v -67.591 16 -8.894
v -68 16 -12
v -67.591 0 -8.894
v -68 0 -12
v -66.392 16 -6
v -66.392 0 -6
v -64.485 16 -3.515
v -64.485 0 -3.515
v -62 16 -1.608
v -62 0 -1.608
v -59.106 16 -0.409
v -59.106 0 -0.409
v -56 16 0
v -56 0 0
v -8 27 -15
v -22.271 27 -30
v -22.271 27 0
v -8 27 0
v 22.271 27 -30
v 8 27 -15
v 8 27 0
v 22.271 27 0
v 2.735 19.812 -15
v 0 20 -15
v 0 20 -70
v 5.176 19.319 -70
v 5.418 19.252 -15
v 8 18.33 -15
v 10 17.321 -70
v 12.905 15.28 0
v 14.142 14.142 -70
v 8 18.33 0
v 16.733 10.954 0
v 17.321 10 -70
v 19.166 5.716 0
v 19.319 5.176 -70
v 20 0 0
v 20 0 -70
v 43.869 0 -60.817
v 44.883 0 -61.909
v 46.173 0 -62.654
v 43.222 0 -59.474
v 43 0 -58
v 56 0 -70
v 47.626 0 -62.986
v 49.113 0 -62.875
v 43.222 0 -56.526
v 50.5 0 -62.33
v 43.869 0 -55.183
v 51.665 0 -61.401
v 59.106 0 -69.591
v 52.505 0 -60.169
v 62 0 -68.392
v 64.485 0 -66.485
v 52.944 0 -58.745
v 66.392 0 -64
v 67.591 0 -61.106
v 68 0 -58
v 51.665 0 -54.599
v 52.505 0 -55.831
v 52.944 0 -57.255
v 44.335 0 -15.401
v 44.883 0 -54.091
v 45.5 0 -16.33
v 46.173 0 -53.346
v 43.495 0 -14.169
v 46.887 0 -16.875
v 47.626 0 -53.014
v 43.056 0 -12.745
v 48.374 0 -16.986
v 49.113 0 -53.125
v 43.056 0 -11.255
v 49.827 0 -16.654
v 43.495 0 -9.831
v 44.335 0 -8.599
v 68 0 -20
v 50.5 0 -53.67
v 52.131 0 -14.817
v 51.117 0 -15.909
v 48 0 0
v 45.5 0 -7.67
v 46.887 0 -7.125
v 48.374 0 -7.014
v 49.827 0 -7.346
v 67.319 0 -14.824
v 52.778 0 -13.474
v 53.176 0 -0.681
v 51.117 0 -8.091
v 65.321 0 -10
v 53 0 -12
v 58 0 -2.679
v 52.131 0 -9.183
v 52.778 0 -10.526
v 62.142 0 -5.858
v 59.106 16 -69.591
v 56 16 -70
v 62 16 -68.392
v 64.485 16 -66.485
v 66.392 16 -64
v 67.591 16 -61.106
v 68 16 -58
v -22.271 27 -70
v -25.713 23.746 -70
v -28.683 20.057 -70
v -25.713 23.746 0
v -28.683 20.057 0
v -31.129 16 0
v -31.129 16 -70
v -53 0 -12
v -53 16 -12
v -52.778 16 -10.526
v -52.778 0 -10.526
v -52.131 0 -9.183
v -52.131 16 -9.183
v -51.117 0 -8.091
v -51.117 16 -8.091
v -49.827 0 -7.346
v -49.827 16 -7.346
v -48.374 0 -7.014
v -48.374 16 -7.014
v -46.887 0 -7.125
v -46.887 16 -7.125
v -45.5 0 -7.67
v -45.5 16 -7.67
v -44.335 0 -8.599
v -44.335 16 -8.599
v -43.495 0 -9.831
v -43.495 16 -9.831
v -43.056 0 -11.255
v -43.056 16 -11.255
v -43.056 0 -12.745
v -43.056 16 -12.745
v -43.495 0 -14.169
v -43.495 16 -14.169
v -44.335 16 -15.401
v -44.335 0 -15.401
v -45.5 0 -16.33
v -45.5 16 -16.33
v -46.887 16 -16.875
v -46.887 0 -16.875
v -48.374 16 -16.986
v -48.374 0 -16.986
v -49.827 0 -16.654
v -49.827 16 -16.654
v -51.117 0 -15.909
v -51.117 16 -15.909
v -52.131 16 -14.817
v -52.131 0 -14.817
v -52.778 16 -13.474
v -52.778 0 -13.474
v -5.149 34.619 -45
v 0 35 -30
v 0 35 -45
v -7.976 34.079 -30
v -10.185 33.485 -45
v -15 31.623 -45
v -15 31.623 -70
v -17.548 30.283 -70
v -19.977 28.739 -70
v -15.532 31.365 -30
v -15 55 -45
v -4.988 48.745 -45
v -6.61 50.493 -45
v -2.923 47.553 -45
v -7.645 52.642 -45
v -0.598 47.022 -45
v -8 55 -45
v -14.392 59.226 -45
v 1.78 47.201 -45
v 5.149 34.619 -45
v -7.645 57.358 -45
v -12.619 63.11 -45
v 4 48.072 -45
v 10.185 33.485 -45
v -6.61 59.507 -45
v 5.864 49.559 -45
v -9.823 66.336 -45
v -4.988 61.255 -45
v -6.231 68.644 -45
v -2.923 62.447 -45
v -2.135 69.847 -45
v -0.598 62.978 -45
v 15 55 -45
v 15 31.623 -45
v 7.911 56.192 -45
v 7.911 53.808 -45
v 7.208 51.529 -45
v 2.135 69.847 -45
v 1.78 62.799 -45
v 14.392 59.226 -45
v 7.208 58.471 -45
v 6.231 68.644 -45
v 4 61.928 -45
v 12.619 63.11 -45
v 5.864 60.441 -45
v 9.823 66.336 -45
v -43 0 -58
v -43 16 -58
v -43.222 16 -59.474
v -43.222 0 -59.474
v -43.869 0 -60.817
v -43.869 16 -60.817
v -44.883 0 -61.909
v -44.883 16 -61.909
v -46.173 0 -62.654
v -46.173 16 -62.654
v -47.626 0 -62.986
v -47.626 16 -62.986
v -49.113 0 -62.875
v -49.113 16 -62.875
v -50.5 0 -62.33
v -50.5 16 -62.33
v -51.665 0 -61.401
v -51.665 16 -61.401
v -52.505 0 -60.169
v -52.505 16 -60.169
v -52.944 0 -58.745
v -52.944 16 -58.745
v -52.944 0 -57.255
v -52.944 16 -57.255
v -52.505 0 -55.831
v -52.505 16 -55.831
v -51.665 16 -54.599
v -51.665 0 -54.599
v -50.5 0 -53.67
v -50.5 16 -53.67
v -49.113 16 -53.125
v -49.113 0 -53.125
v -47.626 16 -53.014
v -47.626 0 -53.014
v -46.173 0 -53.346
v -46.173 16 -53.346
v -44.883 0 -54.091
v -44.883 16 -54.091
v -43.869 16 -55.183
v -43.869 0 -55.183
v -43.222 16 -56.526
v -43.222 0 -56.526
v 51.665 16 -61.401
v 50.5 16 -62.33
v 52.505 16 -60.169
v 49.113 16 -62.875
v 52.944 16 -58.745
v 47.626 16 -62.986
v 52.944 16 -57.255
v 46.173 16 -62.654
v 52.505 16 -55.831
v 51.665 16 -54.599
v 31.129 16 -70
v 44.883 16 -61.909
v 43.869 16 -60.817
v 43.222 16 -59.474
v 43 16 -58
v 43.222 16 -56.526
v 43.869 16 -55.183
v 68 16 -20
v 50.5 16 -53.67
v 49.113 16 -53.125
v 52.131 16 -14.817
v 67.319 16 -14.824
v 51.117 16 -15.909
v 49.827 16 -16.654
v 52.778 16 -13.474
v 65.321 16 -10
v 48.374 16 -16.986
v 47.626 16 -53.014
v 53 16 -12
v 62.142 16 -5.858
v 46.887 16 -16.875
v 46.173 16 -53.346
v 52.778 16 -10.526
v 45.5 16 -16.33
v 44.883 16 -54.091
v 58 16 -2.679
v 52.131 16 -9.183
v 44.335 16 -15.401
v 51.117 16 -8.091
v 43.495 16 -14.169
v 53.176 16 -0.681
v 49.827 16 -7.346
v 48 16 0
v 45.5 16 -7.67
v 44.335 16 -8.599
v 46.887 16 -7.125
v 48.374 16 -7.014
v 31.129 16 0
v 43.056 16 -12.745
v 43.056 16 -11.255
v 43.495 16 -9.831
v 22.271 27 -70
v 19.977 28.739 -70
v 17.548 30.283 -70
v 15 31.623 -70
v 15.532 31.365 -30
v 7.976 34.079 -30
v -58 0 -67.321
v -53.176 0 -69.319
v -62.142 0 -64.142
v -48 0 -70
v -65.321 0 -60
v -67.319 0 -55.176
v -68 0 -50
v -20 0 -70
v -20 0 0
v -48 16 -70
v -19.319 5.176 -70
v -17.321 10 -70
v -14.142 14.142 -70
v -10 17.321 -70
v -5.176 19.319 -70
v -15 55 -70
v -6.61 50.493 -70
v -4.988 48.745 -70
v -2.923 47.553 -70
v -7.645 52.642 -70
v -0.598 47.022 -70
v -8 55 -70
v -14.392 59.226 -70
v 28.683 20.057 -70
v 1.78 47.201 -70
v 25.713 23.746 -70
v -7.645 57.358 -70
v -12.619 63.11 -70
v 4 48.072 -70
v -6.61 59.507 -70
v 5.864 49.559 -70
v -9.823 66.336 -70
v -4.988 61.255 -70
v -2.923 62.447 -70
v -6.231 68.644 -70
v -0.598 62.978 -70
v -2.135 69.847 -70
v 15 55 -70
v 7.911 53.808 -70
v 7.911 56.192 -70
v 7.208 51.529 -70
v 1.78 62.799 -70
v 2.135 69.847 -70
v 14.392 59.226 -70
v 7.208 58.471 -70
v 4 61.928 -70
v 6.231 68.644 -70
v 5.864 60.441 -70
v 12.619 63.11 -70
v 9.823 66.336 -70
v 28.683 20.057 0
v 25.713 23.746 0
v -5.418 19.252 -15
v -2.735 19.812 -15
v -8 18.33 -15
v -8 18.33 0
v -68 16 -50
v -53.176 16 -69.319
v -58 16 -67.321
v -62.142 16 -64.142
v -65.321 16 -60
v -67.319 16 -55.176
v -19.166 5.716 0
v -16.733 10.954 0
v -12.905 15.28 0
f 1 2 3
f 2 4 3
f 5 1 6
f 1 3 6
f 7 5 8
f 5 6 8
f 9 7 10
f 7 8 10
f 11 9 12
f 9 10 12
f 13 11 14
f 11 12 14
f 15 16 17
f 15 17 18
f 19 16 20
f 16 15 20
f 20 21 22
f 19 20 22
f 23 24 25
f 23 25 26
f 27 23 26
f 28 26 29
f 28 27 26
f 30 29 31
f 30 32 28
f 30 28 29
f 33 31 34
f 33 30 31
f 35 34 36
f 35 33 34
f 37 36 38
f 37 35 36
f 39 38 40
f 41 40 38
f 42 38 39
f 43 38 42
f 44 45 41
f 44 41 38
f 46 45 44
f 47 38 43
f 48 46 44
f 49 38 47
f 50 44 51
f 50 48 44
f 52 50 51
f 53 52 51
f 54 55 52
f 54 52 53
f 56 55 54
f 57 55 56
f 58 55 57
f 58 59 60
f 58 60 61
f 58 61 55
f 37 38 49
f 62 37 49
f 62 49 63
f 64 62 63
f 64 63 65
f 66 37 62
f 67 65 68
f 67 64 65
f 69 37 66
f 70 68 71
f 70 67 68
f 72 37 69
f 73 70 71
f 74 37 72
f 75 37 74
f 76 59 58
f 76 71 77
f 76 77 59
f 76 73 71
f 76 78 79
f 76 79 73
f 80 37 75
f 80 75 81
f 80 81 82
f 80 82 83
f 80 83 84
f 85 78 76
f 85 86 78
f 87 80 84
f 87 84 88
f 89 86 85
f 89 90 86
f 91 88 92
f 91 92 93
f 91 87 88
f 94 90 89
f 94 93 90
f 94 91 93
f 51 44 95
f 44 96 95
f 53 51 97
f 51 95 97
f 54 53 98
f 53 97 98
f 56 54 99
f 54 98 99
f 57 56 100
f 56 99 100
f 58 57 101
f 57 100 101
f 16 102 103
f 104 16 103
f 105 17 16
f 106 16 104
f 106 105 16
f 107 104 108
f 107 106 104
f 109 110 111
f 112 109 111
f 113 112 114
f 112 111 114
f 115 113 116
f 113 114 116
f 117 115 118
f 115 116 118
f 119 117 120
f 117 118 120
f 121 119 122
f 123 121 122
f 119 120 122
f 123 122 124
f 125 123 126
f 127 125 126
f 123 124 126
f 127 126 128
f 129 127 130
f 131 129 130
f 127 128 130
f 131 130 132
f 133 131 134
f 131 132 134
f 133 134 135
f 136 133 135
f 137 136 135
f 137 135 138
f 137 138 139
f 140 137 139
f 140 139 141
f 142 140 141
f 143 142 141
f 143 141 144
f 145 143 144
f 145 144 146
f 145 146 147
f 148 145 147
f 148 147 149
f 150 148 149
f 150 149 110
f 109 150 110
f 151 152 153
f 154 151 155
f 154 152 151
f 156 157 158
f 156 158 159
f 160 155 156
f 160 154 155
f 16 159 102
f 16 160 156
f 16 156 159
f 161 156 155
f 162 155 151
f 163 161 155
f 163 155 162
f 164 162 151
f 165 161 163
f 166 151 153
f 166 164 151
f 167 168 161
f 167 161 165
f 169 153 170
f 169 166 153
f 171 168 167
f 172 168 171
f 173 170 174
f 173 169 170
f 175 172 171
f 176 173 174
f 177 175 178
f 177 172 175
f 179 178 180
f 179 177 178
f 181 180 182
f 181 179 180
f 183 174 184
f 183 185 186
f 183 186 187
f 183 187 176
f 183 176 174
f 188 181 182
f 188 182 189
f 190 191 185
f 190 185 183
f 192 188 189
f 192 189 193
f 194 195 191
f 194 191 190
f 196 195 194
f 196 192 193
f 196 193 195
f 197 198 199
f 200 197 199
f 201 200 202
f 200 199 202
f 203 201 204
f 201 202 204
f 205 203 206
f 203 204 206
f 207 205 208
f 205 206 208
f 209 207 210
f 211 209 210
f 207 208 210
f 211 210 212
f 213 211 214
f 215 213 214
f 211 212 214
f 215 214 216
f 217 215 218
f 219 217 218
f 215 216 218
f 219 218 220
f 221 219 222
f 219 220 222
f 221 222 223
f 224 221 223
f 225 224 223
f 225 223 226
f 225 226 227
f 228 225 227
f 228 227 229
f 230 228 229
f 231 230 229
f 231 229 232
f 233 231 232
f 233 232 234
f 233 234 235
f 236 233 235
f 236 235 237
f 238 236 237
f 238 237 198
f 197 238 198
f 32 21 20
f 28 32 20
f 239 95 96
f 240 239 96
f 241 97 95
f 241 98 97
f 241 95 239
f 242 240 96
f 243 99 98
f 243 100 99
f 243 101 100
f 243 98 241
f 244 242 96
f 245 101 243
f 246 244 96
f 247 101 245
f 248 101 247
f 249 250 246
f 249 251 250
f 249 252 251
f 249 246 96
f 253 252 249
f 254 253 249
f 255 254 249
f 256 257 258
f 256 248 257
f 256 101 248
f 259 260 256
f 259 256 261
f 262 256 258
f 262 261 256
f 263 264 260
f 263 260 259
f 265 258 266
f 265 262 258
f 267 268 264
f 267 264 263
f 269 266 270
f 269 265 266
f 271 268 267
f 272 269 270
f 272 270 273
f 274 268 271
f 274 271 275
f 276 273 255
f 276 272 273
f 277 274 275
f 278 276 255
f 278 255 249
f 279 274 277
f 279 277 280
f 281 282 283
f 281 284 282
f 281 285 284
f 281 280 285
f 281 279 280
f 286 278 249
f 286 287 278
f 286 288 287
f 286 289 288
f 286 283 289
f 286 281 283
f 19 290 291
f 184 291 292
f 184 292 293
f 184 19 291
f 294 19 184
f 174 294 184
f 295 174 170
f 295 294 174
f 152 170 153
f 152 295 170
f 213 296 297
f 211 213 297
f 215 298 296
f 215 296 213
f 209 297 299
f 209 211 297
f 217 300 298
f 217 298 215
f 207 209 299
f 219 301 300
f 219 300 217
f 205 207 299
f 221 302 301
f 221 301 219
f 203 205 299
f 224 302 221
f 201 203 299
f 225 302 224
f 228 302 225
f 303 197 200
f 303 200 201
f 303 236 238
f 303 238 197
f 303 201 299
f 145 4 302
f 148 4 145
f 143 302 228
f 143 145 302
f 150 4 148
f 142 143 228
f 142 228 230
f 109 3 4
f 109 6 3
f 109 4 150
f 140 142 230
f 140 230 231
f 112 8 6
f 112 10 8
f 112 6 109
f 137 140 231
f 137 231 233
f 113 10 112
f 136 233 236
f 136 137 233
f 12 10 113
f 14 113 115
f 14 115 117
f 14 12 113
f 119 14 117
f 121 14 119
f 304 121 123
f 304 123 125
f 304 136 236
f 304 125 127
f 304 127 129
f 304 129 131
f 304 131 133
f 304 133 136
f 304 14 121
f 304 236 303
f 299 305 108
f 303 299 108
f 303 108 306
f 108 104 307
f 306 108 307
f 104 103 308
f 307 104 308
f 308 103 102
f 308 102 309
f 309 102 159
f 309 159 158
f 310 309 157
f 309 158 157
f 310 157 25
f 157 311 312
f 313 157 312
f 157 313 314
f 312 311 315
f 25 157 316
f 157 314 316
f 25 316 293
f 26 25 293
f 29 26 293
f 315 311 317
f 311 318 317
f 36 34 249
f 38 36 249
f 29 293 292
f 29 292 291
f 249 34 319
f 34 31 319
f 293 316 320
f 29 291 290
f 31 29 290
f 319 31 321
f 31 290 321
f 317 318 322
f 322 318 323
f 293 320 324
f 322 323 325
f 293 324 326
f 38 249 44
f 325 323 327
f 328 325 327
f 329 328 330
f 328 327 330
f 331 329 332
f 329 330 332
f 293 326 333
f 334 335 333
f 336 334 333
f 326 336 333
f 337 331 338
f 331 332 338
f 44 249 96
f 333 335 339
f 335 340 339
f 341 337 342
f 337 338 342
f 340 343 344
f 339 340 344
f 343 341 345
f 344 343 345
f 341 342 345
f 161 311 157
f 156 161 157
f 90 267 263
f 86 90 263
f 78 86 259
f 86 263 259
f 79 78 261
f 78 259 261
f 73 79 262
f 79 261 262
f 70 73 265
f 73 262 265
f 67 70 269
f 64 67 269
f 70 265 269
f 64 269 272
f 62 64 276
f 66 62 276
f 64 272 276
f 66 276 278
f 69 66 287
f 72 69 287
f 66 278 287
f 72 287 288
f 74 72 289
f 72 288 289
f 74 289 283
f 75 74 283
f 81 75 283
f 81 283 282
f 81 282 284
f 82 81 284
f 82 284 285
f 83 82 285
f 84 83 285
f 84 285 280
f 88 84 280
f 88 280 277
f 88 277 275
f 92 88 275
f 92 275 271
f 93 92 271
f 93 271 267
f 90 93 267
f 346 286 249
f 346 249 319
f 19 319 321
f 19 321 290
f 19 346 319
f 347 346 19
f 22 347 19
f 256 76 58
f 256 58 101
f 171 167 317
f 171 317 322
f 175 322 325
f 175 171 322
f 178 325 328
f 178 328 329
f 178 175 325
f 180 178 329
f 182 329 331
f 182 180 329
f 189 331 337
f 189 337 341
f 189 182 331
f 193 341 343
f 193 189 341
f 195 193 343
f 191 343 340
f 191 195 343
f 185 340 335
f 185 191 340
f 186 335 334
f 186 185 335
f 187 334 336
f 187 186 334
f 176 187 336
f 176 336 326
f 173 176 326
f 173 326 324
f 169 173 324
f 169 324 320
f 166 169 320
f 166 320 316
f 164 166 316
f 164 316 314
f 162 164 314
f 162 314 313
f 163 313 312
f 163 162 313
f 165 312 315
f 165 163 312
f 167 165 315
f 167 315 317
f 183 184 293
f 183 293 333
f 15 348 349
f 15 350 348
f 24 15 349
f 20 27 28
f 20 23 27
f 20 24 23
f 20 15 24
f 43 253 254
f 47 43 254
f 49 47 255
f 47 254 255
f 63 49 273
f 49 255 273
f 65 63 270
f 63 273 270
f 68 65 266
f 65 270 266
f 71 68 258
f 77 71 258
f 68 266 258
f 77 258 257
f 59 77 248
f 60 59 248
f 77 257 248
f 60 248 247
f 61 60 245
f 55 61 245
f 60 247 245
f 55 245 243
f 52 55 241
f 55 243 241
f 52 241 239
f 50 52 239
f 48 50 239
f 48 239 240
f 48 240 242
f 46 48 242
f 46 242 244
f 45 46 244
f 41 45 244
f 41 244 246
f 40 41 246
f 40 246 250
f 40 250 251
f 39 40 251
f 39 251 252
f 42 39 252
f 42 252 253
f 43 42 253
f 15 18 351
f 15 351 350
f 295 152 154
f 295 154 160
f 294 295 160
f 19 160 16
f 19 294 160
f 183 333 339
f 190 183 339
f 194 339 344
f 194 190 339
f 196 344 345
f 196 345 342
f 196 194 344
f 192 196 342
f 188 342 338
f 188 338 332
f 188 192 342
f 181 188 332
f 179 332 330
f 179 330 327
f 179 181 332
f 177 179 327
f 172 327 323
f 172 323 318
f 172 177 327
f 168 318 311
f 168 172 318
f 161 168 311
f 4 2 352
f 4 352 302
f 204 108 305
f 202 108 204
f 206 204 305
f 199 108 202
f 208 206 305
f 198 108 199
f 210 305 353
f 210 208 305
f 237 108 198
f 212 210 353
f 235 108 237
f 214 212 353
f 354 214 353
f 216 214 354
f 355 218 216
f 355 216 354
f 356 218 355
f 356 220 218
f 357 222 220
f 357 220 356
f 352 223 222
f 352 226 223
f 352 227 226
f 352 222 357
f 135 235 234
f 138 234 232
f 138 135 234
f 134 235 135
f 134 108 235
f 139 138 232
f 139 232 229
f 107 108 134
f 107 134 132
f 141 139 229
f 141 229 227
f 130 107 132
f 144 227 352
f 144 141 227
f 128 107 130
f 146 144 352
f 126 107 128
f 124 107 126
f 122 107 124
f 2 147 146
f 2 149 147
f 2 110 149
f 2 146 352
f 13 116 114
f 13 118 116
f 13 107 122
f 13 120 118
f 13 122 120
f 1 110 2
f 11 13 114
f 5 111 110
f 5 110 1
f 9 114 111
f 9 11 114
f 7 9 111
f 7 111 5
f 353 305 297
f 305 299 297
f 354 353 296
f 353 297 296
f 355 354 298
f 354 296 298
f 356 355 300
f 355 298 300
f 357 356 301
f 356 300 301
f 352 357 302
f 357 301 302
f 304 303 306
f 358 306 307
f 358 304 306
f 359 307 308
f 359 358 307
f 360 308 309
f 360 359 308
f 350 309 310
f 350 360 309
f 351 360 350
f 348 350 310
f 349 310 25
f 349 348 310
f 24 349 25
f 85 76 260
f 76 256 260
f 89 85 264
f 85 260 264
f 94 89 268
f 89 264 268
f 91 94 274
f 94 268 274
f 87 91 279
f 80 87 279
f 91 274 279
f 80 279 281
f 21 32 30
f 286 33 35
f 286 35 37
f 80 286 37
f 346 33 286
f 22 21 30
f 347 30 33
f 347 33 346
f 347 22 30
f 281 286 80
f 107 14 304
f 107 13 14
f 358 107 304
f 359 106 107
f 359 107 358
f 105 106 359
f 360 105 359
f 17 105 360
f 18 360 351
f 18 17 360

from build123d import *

# Parameters (mm, degrees)
EXTRUDE_1_DEPTH     = 70
CUT_EXTRUDE_2_DEPTH = 30
SKETCH_5_W          = 16
SKETCH_5_H          = 15
CUT_EXTRUDE_3_DEPTH = 102.257098517
EXTRUDE_START       = -25
SKETCH_6_R          = 8
EXTRUDE_2_DEPTH     = 25
SKETCH_7_R          = 5
CUT_EXTRUDE_4_DEPTH = 112.534747949
FILLET_1_R          = 20
FILLET_2_R          = 12


with BuildPart() as part:
    # 草图1 → 凸台-拉伸1 (new body)
    with BuildSketch(Plane.XY):
        with BuildLine():
            ThreePointArc((-20, 0), (0, 20), (20, 0))
            Line((20, 0), (68, 0))
            Line((68, 0), (68, 16))
            Line((68, 16), (31.128764833, 16))
            ThreePointArc((31.128764833, 16), (0, 35), (-31.128764833, 16))
            Line((-31.128764833, 16), (-68, 16))
            Line((-68, 16), (-68, 0))
            Line((-68, 0), (-20, 0))
        make_face()
    extrude(amount=-EXTRUDE_1_DEPTH)

    # 草图1<13> → 切除-拉伸2 (cut)
    with BuildSketch(Plane.XY):
        with BuildLine():
            Line((-22.271057451, 27), (22.271057451, 27))
            ThreePointArc((22.271057451, 27), (0, 35), (-22.271057451, 27))
        make_face()
    extrude(amount=-CUT_EXTRUDE_2_DEPTH, mode=Mode.SUBTRACT)

    # 草图5 → 切除-拉伸3 (cut, through all)
    with BuildSketch(Plane(origin=(0, 27, 0), x_dir=(1, 0, 0), z_dir=(0, 1, 0))):
        with Locations((0, 7.5)):
            Rectangle(SKETCH_5_W, SKETCH_5_H)
    extrude(amount=-CUT_EXTRUDE_3_DEPTH, mode=Mode.SUBTRACT)

    # 草图6 → 凸台-拉伸2 (add)
    with BuildSketch(Plane(origin=(0, 0, -70), x_dir=(-1, 0, 0), z_dir=(0, 0, -1)).offset(EXTRUDE_START)):
        with BuildLine():
            Line((-15, 31.622776602), (-15, 55))
            ThreePointArc((-15, 55), (0, 70), (15, 55))
            Line((15, 55), (15, 31.622776602))
            ThreePointArc((15, 31.622776602), (0, 35), (-15, 31.622776602))
        make_face()
        with Locations((0, 55)):
            Circle(SKETCH_6_R, mode=Mode.SUBTRACT)
    extrude(amount=EXTRUDE_2_DEPTH)

    # 草图7 → 切除-拉伸4 (cut, through all)
    with BuildSketch(Plane(origin=(0, 16, 0), x_dir=(1, 0, 0), z_dir=(0, 1, 0))):
        with Locations((-48, 12)):
            Circle(SKETCH_7_R)
        with Locations((-48, 58)):
            Circle(SKETCH_7_R)
        with Locations((48, 58)):
            Circle(SKETCH_7_R)
        with Locations((48, 12)):
            Circle(SKETCH_7_R)
    extrude(amount=-CUT_EXTRUDE_4_DEPTH, mode=Mode.SUBTRACT)

    # 圆角1
    fillet_1_edges = [part.edges().sort_by_distance(p)[0] for p in [
        (-68, 8, -70),
        (68, 8, 0),
    ]]
    fillet(fillet_1_edges, radius=FILLET_1_R)

    # 圆角2
    fillet_2_edges = [part.edges().sort_by_distance(p)[0] for p in [
        (68, 8, -70),
        (-68, 8, 0),
    ]]
    fillet(fillet_2_edges, radius=FILLET_2_R)


solid = part.part
